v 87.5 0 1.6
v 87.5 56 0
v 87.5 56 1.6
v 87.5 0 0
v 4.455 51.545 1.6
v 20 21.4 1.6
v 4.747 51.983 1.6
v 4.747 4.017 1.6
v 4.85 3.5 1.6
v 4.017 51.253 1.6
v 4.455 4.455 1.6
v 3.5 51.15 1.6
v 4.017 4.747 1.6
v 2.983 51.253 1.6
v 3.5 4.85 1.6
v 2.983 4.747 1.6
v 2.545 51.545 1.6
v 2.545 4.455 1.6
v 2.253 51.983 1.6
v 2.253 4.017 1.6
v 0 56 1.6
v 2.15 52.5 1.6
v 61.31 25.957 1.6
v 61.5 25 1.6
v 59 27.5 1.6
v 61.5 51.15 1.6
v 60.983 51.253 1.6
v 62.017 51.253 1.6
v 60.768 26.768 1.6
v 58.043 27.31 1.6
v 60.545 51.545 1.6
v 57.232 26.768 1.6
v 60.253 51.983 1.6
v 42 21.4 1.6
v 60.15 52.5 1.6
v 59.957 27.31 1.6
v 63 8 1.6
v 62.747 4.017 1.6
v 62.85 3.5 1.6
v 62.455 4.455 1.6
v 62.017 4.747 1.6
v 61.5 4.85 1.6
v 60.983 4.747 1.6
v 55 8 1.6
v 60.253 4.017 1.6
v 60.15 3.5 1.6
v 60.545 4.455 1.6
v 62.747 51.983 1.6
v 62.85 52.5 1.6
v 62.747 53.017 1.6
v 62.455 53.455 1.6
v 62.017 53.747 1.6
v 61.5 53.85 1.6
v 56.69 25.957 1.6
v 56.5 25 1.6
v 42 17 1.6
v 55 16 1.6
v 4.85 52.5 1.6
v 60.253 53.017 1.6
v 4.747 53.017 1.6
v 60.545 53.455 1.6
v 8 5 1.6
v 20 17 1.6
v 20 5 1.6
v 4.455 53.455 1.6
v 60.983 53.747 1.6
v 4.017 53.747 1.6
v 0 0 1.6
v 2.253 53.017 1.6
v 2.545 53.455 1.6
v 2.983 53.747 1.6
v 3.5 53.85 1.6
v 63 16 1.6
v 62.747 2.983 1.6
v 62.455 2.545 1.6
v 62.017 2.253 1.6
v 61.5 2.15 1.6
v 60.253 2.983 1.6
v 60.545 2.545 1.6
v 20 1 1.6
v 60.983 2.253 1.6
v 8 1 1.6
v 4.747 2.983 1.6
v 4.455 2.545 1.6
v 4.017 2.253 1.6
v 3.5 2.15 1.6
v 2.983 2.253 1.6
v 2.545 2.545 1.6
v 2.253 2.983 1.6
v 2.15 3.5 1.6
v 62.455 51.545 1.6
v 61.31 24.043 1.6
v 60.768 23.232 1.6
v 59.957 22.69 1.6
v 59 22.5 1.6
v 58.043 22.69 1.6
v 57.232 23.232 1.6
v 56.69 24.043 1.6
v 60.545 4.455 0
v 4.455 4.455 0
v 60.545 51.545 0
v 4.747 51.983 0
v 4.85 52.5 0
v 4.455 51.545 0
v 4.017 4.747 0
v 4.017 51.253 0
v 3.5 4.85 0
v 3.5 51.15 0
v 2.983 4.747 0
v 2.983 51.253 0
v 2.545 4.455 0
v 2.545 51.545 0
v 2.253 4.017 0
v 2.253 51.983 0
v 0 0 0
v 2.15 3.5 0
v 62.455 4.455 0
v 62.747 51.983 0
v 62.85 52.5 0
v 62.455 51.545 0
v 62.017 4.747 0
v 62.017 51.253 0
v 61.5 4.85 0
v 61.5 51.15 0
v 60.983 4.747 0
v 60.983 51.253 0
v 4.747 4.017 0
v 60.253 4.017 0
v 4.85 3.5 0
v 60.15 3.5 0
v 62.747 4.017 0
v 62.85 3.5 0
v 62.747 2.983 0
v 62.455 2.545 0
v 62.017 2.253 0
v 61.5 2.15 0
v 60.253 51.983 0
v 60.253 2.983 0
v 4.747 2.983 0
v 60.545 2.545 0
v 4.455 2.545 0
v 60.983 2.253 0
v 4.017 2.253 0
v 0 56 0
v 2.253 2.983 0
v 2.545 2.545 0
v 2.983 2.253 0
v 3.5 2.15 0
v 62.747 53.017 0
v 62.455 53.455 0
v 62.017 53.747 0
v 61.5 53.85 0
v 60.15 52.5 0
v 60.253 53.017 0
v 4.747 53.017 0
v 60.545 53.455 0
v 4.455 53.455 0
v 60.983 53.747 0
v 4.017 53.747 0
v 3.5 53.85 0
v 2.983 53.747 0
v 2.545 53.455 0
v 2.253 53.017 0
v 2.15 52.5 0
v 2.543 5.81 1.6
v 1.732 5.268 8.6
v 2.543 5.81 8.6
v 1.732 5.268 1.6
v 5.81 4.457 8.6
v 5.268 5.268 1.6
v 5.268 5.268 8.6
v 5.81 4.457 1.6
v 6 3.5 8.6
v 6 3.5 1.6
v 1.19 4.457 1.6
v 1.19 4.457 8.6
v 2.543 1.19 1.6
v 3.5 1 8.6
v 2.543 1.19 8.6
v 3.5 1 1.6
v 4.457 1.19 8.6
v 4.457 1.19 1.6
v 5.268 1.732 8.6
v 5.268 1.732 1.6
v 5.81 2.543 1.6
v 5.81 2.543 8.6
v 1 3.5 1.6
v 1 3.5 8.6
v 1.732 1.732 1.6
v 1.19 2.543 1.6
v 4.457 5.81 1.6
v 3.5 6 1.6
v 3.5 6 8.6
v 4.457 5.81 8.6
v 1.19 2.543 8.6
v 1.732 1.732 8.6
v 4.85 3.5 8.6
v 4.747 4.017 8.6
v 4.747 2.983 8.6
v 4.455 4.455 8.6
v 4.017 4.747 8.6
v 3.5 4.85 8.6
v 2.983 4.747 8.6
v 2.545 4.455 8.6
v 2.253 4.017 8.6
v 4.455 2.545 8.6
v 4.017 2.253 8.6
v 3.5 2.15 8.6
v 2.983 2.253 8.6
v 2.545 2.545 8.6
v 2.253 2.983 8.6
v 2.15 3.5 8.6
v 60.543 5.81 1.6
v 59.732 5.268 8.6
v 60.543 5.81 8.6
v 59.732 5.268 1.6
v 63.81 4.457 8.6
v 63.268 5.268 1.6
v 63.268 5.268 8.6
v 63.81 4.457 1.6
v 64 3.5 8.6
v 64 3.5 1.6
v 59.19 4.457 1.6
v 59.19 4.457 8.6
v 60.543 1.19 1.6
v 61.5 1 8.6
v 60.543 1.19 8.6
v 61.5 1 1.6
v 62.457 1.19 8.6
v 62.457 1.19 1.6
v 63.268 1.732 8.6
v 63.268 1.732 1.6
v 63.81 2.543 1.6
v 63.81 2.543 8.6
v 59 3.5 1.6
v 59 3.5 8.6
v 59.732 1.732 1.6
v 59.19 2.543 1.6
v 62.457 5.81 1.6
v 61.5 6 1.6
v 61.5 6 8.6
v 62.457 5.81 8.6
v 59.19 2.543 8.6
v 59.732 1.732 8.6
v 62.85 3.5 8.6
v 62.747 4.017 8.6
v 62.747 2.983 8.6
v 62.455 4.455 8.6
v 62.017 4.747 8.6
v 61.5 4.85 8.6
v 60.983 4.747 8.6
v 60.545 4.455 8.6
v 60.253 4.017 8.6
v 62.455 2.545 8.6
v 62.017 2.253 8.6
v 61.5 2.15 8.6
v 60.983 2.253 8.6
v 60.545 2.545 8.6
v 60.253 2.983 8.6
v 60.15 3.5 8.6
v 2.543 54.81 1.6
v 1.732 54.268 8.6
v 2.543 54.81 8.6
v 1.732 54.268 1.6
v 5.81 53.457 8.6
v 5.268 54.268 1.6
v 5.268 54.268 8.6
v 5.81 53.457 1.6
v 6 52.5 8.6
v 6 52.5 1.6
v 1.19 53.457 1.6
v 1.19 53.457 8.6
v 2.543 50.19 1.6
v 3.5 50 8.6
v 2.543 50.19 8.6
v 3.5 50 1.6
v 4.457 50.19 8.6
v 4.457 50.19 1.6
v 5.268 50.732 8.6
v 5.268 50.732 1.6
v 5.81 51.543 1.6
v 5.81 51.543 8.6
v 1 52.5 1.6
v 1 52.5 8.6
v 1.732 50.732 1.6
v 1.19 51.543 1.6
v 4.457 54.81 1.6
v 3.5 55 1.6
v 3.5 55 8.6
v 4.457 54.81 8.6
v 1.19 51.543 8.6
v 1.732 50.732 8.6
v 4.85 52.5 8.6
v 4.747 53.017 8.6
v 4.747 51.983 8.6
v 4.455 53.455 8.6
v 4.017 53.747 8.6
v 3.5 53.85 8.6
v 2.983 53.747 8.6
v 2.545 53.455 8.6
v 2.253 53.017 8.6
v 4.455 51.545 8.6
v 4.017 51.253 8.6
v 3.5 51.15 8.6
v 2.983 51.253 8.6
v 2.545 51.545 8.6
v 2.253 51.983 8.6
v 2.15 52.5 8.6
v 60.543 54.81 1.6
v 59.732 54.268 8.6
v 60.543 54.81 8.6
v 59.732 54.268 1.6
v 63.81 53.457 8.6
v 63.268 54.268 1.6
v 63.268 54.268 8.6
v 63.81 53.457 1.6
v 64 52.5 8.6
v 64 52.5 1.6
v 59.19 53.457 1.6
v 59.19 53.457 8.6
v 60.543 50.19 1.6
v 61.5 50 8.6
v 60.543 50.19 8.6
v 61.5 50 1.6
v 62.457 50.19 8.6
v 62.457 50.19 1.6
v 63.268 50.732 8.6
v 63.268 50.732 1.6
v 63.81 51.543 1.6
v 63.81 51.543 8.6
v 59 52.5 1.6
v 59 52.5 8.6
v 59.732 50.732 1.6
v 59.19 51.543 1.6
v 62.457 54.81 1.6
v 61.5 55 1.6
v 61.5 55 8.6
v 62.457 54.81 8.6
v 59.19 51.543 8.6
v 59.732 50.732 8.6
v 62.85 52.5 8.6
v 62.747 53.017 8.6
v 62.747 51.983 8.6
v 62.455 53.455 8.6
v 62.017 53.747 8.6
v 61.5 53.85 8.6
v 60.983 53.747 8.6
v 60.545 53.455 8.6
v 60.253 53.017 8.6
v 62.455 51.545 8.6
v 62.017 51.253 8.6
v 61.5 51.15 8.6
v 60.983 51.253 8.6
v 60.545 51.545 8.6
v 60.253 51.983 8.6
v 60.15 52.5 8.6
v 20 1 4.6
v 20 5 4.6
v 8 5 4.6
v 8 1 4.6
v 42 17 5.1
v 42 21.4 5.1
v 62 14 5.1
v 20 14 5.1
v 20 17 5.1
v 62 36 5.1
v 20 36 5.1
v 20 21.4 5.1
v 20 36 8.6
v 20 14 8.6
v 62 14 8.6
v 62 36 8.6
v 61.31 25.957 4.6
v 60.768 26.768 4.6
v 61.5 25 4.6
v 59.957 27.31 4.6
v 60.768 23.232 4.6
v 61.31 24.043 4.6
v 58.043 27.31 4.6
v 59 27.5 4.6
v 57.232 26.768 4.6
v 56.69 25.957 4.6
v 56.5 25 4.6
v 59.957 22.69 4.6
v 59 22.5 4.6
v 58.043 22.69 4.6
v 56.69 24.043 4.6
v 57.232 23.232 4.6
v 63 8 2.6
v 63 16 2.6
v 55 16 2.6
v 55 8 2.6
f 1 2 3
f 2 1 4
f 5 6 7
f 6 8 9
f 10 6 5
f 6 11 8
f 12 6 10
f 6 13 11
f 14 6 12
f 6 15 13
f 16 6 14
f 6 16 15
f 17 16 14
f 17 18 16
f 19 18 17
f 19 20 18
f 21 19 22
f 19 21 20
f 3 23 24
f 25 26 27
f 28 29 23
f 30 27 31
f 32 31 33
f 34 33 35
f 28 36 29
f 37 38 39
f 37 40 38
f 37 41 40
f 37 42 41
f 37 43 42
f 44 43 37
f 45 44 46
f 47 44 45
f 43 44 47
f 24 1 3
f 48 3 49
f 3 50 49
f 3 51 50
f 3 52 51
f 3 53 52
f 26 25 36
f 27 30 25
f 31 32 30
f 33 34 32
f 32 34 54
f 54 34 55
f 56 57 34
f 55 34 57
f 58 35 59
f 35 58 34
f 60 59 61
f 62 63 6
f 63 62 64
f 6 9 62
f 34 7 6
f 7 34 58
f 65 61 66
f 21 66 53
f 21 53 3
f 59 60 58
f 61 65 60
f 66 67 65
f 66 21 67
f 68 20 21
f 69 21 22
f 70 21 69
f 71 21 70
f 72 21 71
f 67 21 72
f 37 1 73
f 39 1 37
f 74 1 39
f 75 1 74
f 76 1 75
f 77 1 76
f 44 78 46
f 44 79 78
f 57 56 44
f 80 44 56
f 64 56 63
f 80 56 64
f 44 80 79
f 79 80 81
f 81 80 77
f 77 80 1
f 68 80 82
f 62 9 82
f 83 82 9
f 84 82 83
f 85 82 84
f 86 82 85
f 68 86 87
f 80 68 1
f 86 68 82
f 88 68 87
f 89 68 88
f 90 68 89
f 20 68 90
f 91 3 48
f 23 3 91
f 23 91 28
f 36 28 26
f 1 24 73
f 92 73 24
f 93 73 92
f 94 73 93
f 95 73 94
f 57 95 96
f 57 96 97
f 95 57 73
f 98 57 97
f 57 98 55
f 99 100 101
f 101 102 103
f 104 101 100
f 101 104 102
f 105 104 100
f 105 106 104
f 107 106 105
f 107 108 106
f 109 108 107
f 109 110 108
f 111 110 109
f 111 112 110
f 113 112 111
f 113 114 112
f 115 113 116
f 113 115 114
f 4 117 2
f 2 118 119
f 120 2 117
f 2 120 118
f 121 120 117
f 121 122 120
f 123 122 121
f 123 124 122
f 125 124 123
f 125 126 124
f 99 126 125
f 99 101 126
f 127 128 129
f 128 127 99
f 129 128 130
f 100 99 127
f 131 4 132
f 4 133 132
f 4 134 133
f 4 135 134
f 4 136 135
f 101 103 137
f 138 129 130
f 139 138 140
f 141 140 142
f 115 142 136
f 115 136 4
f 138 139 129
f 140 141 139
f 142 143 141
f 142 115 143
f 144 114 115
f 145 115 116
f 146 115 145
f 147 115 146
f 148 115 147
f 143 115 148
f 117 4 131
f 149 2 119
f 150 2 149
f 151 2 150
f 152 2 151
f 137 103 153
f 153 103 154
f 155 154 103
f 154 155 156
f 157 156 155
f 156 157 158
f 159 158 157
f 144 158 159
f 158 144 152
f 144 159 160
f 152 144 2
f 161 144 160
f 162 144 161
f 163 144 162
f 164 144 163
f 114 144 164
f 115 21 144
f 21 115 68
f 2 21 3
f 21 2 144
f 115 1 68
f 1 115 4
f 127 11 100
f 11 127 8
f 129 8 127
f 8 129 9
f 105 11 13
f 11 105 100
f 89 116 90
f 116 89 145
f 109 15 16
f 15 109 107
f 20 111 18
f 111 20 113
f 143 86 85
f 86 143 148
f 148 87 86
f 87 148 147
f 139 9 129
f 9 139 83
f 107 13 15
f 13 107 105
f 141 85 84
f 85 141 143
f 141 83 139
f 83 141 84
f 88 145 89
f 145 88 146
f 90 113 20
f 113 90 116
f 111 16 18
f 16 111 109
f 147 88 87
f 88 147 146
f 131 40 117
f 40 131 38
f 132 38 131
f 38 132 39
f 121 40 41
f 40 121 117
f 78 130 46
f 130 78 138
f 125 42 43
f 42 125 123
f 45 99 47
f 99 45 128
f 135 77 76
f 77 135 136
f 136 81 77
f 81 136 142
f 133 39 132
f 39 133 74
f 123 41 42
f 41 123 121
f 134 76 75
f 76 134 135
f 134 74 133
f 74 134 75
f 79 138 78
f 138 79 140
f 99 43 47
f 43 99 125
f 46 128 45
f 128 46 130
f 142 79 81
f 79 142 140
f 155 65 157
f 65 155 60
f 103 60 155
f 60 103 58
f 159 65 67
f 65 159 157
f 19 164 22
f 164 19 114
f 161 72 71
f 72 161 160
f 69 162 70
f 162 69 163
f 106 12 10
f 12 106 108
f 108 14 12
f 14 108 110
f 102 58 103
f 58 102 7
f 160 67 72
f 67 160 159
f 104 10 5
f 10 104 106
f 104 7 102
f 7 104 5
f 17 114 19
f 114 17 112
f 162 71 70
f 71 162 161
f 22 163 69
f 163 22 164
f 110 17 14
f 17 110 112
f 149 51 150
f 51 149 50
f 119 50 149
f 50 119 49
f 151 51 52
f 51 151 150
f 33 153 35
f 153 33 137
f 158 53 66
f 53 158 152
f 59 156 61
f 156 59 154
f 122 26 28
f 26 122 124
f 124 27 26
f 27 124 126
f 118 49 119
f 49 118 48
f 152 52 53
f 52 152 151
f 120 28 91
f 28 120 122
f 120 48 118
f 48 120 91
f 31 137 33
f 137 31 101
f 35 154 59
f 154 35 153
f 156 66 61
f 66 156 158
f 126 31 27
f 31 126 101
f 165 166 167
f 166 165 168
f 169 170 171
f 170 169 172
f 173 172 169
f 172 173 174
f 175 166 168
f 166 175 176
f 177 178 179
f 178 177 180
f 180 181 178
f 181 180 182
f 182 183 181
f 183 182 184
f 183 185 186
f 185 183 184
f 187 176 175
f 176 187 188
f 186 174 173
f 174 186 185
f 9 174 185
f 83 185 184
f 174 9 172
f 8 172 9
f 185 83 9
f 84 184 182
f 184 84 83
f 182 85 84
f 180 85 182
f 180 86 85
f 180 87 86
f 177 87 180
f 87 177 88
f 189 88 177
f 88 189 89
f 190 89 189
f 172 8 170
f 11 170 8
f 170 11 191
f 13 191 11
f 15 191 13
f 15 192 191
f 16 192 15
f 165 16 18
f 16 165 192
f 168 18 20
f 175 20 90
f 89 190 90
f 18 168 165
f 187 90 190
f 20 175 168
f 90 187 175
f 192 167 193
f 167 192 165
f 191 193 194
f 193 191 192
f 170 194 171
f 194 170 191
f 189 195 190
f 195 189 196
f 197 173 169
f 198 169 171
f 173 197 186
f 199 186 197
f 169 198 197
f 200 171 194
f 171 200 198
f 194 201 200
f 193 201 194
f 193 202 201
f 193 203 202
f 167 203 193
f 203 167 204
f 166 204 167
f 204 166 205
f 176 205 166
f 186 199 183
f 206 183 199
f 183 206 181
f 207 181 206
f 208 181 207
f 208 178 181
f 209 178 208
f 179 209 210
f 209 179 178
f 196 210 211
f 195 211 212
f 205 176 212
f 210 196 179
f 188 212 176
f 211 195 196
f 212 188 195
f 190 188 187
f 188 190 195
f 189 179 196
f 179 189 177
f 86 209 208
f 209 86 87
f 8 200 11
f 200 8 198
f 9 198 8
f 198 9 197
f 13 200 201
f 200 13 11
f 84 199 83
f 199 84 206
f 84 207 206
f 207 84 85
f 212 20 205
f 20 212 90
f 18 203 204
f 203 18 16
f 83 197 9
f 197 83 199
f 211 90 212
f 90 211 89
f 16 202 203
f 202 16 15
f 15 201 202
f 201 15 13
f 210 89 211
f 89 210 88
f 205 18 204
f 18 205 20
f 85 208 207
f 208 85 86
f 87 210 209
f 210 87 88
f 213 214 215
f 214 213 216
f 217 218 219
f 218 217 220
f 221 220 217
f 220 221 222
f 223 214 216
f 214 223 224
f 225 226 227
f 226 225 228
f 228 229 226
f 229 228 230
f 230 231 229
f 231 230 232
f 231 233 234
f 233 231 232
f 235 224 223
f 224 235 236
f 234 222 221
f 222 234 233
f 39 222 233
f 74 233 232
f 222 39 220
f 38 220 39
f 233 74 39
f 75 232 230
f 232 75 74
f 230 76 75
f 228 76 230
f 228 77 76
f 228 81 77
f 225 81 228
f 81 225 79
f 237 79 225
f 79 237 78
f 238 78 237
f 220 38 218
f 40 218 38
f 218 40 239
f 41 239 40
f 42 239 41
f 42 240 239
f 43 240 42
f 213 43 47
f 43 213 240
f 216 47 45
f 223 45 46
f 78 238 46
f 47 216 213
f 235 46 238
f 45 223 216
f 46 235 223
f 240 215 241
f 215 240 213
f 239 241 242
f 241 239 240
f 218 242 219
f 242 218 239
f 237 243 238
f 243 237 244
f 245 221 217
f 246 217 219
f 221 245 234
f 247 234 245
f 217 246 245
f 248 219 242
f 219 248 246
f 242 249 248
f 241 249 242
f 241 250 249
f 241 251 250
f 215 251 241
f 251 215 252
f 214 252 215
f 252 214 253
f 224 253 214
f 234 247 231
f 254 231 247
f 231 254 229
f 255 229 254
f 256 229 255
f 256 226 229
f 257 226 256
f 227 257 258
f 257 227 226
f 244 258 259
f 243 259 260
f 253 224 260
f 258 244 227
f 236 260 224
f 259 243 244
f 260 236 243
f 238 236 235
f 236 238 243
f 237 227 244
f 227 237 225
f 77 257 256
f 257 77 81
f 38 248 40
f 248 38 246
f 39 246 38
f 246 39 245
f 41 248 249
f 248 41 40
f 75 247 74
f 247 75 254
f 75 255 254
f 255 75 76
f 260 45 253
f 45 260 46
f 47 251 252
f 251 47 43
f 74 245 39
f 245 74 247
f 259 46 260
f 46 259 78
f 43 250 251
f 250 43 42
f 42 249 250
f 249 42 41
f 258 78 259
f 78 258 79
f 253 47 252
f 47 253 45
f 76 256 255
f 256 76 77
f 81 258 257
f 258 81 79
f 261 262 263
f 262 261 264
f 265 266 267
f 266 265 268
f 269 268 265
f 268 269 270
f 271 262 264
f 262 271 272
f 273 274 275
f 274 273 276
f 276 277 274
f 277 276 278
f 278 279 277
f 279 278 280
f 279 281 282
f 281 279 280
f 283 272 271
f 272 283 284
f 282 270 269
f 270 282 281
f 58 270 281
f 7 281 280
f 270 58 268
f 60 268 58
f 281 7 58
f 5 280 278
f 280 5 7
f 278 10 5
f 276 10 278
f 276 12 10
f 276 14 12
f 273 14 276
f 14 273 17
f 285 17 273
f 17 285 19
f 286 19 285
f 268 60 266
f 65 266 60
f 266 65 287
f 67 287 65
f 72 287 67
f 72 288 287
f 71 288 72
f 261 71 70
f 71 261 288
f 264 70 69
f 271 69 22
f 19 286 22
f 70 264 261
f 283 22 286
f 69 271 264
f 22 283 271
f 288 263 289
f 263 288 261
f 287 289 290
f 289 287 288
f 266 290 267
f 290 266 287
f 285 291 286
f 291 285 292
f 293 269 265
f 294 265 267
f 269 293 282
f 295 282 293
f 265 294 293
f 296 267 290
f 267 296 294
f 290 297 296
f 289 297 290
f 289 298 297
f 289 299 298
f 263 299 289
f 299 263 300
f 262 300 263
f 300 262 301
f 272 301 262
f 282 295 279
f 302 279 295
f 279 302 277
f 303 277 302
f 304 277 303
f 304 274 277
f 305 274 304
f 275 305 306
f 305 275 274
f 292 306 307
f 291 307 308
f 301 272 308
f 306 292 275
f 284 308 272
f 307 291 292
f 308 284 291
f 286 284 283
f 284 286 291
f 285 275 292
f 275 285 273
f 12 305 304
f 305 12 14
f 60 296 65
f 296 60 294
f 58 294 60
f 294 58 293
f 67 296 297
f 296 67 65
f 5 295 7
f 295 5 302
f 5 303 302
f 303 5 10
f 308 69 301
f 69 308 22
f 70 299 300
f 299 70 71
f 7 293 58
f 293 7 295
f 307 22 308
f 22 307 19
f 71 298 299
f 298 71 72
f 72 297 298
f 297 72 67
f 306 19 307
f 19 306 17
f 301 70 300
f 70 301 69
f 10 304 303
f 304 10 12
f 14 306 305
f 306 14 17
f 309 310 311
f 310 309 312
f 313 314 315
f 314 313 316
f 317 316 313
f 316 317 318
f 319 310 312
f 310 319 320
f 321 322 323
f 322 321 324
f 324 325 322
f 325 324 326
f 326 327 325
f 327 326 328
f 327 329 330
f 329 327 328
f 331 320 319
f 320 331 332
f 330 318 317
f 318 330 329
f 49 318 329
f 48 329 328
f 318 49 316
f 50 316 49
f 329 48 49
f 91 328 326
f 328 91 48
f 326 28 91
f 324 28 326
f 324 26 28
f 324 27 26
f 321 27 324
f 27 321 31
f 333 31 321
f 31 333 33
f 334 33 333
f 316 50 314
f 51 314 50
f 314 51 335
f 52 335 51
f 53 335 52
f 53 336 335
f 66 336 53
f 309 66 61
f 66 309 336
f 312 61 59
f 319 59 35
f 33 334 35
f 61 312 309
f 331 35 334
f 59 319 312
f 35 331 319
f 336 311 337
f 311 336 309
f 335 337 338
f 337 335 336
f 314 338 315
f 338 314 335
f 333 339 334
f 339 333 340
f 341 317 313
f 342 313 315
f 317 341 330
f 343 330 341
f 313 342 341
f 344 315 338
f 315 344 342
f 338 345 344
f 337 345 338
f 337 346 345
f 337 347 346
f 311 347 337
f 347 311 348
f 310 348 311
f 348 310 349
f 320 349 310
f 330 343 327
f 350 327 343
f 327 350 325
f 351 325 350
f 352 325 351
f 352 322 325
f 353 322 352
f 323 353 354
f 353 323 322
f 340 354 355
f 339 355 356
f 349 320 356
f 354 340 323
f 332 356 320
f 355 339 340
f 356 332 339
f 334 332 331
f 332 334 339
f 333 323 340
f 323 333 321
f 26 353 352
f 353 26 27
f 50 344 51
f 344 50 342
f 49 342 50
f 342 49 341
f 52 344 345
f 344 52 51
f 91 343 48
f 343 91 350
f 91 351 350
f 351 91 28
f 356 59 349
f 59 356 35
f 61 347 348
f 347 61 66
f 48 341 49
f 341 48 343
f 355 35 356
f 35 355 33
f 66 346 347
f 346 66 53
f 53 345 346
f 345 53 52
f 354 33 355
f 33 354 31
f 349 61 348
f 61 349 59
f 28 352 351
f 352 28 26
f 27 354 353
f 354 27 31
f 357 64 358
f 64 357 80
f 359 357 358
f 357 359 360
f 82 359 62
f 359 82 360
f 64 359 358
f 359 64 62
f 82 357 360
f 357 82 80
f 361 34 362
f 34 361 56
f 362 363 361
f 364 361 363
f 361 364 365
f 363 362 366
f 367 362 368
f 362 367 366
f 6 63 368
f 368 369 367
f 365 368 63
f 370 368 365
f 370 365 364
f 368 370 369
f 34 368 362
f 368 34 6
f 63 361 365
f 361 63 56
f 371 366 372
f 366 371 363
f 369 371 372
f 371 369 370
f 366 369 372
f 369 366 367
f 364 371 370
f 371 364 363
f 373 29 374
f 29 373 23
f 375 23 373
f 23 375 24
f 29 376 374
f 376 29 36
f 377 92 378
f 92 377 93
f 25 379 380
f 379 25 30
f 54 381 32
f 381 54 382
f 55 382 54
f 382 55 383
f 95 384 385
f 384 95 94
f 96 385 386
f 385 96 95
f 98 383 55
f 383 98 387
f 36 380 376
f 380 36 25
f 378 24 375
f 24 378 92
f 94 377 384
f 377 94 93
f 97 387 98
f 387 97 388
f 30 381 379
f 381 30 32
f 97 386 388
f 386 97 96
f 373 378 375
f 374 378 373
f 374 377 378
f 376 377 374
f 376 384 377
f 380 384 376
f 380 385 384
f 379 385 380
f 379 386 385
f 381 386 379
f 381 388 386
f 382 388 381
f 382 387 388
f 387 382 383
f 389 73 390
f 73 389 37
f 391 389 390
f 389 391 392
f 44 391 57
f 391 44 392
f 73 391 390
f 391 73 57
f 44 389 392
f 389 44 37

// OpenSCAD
// Pimoroni NVMe Base — HAT-format PCIe M.2 NVMe carrier for Raspberry Pi 5
// PCB: 87.5 × 56 × 1.6 mm (HAT footprint)
// Mounting: 4× M2.5, same hole pattern as RPi 5 (58×49 mm, 3.5 mm from corners)
// Stacks below RPi 5 with 7 mm M2.5 board-to-board spacers (included in Pimoroni kit)

module nvme_base(ssd_length=42) {
    pcb_h = 1.6;

    // PCB body (with mounting holes)
    difference() {
        color("darkgreen") cube([87.5, 56, pcb_h]);
        // 4× M2.5 mounting holes Ø2.7mm, 3.5 mm from each corner, 58×49 mm spacing
        translate([3.5,  3.5,  -0.1]) cylinder(h=pcb_h + 0.2, d=2.7, $fn=16);
        translate([61.5, 3.5,  -0.1]) cylinder(h=pcb_h + 0.2, d=2.7, $fn=16);
        translate([3.5,  52.5, -0.1]) cylinder(h=pcb_h + 0.2, d=2.7, $fn=16);
        translate([61.5, 52.5, -0.1]) cylinder(h=pcb_h + 0.2, d=2.7, $fn=16);
    }

    // --- Components on PCB top face (Z=pcb_h above PCB bottom) ---

    // FPC connector → RPi 5 PCIe port (right side, toward RPi)
    translate([8, 1, pcb_h])
        color("white") cube([12, 4, 3]);

    // M.2 Key-M edge connector
    translate([20, 17, pcb_h])
        color("silver") cube([22, 4.4, 3.5]);

    // NVMe SSD placeholder (M.2 form factor)
    translate([20, 14, pcb_h + 3.5])
        color("dimgray") cube([ssd_length, 22, 3.5]);

    // Retention screw boss (cylinder at far end of SSD)
    translate([20 + ssd_length - 3, 25, pcb_h])
        color("darkgray") cylinder(h=3, d=5, $fn=16);

    // NVMe controller IC
    translate([55, 8, pcb_h])
        color("darkgray") cube([8, 8, 1]);

    // 4× M2.5 board-to-board spacers (Pimoroni kit), Ø5 OD, H=7, bore Ø2.7
    for (pos = [[3.5, 3.5], [61.5, 3.5], [3.5, 52.5], [61.5, 52.5]]) {
        translate([pos[0], pos[1], pcb_h])
            difference() {
                color("silver") cylinder(h=7, d=5, $fn=16);
                translate([0, 0, -0.1]) cylinder(h=7.2, d=2.7, $fn=16);
            }
    }
}

nvme_base();
